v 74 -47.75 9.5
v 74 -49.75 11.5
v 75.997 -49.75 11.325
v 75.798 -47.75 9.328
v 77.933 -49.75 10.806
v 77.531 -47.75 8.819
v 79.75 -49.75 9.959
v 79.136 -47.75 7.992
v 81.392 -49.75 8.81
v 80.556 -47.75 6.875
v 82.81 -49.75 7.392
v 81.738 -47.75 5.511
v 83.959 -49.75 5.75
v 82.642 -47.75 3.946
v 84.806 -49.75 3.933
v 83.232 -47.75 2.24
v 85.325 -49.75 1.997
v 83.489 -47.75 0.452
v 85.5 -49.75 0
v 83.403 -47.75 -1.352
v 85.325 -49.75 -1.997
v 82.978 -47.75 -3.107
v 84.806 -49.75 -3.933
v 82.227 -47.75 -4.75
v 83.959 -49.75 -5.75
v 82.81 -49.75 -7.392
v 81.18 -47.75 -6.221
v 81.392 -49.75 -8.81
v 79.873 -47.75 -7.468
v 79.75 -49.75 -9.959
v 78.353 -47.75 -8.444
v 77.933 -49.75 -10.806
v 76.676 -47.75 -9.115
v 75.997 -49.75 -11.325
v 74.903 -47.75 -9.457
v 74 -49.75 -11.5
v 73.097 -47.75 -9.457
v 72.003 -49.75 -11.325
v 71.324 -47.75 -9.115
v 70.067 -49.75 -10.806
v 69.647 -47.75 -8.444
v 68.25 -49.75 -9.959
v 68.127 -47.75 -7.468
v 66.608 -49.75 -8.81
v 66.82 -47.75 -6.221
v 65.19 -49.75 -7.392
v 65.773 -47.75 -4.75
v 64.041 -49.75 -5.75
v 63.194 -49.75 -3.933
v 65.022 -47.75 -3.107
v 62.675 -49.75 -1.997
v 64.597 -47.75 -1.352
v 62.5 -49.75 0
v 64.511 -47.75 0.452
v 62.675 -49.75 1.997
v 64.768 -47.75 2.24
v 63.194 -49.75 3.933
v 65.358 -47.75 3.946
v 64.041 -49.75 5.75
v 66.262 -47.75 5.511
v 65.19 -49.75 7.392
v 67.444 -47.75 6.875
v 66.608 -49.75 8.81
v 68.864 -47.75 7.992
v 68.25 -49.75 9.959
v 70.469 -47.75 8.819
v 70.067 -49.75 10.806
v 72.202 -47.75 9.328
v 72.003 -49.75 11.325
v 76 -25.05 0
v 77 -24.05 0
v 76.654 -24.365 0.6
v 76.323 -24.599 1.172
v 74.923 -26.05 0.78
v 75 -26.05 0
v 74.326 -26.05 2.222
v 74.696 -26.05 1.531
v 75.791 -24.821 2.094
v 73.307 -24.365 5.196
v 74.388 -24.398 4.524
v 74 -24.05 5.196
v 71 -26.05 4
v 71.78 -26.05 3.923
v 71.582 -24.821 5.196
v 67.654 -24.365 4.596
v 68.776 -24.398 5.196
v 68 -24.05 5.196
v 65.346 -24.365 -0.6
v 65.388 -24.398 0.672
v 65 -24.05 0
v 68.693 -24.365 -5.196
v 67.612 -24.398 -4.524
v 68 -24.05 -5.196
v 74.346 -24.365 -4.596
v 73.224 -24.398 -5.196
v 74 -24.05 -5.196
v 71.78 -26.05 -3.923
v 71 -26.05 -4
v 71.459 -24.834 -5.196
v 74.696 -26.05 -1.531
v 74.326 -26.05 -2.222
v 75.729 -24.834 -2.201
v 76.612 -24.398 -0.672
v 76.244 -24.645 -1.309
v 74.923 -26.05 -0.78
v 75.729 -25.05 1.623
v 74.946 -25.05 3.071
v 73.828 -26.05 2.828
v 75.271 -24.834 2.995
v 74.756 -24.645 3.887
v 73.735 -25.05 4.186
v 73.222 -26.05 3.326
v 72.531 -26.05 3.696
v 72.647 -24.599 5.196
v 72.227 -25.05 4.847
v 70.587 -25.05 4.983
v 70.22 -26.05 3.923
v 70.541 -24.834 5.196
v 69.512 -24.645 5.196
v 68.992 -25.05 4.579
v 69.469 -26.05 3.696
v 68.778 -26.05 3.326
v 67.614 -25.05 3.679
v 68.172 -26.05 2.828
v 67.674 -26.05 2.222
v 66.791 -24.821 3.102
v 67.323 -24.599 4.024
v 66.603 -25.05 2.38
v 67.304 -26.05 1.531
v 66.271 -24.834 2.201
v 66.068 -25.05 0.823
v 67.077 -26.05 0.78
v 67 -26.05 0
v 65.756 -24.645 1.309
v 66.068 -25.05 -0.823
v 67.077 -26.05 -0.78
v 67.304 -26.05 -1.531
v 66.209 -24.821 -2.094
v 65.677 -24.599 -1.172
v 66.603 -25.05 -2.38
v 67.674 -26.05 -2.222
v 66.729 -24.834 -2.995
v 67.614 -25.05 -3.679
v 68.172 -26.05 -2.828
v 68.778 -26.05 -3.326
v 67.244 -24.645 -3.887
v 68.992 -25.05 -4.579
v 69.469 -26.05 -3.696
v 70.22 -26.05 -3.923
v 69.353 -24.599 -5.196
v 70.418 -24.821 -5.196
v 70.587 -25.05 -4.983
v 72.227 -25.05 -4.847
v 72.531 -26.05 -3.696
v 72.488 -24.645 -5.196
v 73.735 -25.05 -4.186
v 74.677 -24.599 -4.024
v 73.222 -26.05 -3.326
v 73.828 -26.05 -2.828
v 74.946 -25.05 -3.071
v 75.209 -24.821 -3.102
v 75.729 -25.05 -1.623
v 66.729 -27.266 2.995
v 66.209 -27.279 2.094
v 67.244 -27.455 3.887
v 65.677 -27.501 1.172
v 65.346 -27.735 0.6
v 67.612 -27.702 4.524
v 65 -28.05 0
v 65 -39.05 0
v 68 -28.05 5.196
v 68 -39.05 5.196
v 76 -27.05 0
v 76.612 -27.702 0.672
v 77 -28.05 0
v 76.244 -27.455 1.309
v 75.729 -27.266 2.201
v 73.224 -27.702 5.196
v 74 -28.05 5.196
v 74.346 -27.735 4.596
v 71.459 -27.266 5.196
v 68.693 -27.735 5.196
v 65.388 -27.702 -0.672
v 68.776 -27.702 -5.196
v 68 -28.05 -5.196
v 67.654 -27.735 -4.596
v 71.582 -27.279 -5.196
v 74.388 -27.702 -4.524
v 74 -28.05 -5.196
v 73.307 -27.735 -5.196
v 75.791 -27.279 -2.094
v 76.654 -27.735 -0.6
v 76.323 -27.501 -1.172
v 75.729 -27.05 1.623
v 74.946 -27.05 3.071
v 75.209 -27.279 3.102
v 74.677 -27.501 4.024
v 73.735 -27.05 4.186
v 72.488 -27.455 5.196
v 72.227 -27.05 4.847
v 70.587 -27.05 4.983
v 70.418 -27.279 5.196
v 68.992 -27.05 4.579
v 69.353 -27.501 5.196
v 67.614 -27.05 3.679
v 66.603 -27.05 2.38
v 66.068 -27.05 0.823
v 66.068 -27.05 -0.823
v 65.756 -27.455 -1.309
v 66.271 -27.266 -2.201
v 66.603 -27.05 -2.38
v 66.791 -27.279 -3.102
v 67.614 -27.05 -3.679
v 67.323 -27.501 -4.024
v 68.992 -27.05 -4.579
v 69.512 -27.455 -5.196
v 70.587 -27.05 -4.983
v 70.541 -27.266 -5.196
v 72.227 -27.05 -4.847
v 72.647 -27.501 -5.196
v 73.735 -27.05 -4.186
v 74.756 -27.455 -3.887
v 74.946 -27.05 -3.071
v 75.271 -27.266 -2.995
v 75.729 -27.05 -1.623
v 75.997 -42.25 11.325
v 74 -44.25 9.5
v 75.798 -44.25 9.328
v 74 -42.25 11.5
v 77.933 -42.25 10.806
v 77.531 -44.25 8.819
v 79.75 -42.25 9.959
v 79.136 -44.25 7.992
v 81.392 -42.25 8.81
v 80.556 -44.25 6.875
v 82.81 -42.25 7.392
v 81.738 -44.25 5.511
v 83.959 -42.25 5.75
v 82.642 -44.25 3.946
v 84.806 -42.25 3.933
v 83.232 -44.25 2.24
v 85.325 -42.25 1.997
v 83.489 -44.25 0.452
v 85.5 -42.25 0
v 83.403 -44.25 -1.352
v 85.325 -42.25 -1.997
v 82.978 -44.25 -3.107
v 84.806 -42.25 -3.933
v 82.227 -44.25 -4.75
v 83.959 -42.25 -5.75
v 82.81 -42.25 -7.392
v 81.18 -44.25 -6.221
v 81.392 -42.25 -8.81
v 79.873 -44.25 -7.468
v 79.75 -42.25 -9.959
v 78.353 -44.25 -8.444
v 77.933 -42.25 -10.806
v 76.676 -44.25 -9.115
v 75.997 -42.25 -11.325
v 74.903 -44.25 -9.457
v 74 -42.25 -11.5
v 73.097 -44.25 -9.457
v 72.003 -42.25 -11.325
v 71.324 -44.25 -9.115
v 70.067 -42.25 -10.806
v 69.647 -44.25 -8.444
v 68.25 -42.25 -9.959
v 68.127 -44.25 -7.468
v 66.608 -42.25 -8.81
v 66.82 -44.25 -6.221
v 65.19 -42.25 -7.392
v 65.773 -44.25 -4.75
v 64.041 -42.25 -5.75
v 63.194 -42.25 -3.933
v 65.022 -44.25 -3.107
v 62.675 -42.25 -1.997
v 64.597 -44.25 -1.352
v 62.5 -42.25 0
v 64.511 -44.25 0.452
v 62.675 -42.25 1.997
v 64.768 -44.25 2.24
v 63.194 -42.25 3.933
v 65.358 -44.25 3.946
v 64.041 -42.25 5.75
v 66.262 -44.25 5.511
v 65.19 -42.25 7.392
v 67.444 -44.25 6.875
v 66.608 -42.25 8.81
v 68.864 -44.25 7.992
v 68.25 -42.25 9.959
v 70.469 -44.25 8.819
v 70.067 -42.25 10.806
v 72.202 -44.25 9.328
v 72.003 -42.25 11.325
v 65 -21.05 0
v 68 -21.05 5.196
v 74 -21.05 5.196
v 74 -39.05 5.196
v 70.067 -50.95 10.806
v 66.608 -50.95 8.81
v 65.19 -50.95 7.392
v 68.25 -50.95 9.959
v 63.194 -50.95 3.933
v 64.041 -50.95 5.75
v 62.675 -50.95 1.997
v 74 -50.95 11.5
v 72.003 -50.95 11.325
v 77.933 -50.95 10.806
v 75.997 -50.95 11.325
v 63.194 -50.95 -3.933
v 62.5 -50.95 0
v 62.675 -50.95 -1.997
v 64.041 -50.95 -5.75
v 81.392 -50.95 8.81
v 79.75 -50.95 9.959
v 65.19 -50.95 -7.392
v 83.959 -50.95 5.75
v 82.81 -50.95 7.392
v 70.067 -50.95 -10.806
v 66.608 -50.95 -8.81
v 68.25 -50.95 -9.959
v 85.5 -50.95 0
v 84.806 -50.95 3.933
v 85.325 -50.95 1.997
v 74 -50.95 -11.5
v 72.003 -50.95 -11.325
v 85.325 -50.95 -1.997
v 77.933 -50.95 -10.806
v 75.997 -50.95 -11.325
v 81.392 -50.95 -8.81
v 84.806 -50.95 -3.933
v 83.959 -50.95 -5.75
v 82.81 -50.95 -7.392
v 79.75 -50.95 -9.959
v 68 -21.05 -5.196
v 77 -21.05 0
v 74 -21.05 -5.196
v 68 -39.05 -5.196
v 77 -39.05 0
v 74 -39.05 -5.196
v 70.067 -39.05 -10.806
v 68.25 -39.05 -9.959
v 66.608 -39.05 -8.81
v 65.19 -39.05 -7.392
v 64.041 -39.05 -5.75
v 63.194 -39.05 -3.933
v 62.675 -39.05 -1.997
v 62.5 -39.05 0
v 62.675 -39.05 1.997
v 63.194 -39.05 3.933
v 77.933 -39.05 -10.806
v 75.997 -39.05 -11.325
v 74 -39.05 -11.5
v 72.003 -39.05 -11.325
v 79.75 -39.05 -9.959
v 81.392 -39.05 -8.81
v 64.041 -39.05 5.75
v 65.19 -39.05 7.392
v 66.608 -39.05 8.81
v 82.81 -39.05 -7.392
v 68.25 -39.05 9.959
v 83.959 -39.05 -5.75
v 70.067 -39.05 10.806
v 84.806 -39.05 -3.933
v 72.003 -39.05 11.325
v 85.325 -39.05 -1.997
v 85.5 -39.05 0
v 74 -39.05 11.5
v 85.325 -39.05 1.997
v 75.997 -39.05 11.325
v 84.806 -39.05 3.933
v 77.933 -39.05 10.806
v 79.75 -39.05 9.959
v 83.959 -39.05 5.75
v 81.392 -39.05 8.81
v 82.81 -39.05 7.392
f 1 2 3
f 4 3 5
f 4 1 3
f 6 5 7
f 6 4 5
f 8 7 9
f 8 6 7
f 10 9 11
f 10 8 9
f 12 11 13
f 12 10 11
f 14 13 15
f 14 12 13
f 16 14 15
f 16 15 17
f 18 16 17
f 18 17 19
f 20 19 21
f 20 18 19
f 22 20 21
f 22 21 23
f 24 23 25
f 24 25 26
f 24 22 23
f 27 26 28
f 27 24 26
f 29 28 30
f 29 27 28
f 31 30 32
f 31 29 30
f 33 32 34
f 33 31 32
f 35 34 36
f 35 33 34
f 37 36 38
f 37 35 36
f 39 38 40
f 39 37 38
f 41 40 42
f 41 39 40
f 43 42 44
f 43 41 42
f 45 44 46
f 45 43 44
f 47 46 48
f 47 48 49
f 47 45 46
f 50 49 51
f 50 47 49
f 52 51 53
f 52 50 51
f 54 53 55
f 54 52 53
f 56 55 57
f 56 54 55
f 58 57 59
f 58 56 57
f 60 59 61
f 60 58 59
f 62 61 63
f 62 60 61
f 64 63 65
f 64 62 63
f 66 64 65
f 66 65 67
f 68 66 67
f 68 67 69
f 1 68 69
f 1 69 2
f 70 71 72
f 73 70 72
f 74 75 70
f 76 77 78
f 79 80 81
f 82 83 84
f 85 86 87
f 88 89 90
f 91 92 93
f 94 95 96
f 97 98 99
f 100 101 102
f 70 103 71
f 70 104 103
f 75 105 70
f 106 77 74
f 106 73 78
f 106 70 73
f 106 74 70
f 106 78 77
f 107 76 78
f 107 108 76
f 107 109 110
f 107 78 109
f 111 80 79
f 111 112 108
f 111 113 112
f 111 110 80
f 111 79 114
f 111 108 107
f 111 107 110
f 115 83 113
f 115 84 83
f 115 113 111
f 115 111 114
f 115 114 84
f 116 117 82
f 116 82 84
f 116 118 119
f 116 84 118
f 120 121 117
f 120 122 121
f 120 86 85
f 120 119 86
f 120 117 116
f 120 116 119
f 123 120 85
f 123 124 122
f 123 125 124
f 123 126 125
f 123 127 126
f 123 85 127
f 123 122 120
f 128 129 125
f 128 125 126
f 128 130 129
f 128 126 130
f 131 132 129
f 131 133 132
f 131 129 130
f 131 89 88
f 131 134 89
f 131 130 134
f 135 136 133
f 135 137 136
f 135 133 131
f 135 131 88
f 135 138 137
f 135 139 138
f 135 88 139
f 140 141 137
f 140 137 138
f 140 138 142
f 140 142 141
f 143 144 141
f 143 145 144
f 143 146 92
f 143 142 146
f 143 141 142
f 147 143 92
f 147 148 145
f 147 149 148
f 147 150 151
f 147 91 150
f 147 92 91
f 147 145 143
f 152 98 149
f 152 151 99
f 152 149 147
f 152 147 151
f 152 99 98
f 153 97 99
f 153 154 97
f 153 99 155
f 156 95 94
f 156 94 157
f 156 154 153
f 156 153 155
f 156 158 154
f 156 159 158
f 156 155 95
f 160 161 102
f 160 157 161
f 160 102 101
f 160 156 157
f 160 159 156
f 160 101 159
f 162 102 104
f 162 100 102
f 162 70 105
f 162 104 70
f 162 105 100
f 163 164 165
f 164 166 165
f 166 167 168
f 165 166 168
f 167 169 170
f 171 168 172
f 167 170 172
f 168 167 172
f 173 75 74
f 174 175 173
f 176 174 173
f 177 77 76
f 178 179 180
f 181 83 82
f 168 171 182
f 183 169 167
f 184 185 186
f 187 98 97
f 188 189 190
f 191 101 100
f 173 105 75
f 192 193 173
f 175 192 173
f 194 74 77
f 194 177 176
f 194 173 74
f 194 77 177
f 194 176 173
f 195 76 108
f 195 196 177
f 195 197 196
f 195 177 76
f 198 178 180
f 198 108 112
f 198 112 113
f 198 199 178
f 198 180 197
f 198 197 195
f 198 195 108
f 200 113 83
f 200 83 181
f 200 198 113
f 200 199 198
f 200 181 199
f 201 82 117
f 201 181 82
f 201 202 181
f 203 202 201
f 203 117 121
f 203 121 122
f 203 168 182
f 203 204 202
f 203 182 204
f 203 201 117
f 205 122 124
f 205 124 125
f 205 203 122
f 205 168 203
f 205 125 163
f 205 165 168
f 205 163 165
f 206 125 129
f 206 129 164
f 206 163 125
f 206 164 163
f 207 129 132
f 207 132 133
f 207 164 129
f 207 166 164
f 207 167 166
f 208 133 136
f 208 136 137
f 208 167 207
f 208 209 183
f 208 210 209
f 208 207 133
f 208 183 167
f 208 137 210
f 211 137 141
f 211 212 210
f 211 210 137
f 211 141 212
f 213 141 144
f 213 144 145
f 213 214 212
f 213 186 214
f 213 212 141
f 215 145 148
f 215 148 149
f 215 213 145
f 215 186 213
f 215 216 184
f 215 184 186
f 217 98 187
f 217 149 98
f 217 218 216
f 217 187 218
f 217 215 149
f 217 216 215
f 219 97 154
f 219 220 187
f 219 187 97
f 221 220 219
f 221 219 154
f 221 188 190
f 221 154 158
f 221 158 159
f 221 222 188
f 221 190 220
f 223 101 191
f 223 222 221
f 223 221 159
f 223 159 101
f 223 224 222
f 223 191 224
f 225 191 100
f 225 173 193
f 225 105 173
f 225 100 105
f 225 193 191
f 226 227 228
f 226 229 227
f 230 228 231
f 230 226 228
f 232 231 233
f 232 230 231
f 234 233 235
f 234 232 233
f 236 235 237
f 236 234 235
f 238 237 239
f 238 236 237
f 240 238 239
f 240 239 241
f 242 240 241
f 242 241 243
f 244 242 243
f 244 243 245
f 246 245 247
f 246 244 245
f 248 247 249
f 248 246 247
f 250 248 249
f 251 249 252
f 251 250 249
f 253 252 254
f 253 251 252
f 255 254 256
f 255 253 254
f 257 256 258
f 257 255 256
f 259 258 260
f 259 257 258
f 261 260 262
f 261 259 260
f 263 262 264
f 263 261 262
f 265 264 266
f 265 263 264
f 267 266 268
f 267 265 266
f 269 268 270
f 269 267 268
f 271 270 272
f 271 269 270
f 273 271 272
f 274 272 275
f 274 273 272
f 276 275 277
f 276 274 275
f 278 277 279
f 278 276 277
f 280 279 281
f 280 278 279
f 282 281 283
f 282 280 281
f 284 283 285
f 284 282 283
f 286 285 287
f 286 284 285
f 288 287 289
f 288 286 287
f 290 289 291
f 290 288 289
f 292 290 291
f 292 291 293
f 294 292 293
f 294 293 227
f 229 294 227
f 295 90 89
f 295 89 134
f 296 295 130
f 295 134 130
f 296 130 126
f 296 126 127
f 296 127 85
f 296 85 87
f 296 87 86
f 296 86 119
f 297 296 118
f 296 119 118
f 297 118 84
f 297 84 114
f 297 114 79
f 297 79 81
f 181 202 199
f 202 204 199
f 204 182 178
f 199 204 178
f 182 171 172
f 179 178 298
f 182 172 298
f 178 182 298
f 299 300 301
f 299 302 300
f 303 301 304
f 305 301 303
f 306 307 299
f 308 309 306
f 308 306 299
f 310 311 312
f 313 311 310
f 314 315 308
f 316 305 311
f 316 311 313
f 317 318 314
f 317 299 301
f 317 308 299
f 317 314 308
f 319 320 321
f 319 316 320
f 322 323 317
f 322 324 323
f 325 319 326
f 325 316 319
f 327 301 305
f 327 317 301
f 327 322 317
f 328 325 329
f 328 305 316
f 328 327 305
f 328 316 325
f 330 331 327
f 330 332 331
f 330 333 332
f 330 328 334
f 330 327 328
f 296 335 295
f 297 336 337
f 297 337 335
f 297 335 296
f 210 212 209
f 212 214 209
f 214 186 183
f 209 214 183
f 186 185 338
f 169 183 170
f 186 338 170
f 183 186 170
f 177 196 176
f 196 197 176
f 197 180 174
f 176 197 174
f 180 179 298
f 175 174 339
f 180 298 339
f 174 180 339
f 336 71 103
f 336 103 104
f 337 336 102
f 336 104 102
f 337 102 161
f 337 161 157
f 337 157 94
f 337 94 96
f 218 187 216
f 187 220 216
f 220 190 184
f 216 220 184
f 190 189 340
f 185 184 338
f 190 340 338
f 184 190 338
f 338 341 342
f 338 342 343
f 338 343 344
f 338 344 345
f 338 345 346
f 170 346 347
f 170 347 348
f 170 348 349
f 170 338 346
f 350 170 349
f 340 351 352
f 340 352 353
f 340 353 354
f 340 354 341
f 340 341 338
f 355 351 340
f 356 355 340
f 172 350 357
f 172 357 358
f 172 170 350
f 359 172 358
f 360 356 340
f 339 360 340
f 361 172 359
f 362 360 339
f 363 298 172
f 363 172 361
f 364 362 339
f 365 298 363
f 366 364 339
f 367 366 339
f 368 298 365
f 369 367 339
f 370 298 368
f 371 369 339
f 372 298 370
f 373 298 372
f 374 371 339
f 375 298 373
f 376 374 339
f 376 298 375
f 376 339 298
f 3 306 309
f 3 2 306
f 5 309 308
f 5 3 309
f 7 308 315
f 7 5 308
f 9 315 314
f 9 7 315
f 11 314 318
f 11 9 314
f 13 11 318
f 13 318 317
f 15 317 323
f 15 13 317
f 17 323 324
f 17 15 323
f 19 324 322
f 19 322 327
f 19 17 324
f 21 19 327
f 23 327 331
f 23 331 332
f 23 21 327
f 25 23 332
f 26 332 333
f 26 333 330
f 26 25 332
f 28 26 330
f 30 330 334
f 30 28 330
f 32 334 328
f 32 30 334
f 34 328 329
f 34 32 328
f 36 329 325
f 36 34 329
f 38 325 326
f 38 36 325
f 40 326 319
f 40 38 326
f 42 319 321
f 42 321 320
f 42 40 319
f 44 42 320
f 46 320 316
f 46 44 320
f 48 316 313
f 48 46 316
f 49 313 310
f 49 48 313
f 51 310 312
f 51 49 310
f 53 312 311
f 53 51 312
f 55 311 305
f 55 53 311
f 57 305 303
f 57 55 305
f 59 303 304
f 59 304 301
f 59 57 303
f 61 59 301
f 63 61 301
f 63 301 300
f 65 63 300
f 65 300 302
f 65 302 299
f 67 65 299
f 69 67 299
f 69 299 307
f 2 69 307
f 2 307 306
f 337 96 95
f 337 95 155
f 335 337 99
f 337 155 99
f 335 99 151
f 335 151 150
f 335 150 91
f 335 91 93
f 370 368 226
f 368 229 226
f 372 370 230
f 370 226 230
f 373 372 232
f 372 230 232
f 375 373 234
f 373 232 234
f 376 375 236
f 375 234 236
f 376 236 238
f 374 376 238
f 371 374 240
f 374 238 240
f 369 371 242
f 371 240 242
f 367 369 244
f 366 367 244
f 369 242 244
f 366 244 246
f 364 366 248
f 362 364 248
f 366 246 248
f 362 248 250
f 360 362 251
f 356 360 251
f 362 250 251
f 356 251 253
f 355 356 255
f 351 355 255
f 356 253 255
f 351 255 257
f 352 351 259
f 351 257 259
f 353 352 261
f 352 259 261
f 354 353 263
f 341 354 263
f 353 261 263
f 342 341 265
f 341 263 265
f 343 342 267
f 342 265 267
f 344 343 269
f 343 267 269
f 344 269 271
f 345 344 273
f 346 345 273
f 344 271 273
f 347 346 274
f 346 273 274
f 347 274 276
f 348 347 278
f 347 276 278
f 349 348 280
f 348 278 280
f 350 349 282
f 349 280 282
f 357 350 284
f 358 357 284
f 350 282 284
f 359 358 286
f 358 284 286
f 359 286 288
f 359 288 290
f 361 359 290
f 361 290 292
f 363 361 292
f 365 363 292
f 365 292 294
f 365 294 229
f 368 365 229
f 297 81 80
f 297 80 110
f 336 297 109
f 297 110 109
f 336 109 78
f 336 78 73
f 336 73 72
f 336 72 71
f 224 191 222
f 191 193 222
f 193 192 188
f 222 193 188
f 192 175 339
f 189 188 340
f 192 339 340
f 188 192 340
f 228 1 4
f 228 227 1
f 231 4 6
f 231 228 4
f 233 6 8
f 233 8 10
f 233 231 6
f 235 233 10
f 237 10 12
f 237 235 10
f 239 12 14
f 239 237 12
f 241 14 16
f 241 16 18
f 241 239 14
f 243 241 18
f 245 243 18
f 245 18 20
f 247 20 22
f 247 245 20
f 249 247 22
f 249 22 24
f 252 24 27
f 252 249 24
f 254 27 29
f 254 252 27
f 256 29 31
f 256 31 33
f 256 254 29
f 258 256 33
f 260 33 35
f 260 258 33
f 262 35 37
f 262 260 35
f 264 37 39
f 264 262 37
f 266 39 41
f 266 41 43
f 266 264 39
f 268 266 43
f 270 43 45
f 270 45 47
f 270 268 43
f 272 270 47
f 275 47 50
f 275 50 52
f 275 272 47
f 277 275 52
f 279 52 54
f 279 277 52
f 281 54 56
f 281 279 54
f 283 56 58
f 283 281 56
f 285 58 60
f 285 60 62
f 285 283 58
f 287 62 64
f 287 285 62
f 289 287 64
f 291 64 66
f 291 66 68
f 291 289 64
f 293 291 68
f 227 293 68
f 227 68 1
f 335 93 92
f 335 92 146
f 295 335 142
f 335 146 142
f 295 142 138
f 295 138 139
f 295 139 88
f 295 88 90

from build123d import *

# Parameters (mm, degrees)
PAD_DEPTH = 20


with BuildPart() as part:
    # Sketch039 → Revolution002 (revolve)
    with BuildSketch(Plane.YZ):
        Polygon((6.95, 11.5), (6.95, 0), (-4.95, 0), (-4.95, 11.5), (-3.75, 11.5), (-1.75, 9.5), (1.75, 9.5), (3.75, 11.5), (4.95, 11.5), align=None)
    revolve(axis=Axis((0, 0, 0), (0, 1, 0)))

    # Sketch041 (on DatumPlane) → Pad (new body)
    with BuildSketch(Plane(origin=(-3, 4.95, 0), x_dir=(0, 0, 1), z_dir=(0, 1, 0))):
        Polygon((0, 6), (-5.196152, 3), (-5.196152, -3), (0, -6), (5.196152, -3), (5.196152, 3), align=None)
    extrude(amount=PAD_DEPTH)

    # Sketch042 (on DatumPlane) → Groove (revolve, cut)
    with BuildSketch(Plane(origin=(-3, 4.95, 0), x_dir=(0, -1, 0), z_dir=(0, 0, 1))):
        Polygon((-17, 6), (-15, 4), (-13, 6), align=None)
    revolve(axis=Axis((-3, 4.95, 0), (0, -1, 0)), mode=Mode.SUBTRACT)


with BuildPart() as part_1:
    # Body007 placement: moved
    add(part.part.moved(Location((74, -46, 0))))


solid = part_1.part
